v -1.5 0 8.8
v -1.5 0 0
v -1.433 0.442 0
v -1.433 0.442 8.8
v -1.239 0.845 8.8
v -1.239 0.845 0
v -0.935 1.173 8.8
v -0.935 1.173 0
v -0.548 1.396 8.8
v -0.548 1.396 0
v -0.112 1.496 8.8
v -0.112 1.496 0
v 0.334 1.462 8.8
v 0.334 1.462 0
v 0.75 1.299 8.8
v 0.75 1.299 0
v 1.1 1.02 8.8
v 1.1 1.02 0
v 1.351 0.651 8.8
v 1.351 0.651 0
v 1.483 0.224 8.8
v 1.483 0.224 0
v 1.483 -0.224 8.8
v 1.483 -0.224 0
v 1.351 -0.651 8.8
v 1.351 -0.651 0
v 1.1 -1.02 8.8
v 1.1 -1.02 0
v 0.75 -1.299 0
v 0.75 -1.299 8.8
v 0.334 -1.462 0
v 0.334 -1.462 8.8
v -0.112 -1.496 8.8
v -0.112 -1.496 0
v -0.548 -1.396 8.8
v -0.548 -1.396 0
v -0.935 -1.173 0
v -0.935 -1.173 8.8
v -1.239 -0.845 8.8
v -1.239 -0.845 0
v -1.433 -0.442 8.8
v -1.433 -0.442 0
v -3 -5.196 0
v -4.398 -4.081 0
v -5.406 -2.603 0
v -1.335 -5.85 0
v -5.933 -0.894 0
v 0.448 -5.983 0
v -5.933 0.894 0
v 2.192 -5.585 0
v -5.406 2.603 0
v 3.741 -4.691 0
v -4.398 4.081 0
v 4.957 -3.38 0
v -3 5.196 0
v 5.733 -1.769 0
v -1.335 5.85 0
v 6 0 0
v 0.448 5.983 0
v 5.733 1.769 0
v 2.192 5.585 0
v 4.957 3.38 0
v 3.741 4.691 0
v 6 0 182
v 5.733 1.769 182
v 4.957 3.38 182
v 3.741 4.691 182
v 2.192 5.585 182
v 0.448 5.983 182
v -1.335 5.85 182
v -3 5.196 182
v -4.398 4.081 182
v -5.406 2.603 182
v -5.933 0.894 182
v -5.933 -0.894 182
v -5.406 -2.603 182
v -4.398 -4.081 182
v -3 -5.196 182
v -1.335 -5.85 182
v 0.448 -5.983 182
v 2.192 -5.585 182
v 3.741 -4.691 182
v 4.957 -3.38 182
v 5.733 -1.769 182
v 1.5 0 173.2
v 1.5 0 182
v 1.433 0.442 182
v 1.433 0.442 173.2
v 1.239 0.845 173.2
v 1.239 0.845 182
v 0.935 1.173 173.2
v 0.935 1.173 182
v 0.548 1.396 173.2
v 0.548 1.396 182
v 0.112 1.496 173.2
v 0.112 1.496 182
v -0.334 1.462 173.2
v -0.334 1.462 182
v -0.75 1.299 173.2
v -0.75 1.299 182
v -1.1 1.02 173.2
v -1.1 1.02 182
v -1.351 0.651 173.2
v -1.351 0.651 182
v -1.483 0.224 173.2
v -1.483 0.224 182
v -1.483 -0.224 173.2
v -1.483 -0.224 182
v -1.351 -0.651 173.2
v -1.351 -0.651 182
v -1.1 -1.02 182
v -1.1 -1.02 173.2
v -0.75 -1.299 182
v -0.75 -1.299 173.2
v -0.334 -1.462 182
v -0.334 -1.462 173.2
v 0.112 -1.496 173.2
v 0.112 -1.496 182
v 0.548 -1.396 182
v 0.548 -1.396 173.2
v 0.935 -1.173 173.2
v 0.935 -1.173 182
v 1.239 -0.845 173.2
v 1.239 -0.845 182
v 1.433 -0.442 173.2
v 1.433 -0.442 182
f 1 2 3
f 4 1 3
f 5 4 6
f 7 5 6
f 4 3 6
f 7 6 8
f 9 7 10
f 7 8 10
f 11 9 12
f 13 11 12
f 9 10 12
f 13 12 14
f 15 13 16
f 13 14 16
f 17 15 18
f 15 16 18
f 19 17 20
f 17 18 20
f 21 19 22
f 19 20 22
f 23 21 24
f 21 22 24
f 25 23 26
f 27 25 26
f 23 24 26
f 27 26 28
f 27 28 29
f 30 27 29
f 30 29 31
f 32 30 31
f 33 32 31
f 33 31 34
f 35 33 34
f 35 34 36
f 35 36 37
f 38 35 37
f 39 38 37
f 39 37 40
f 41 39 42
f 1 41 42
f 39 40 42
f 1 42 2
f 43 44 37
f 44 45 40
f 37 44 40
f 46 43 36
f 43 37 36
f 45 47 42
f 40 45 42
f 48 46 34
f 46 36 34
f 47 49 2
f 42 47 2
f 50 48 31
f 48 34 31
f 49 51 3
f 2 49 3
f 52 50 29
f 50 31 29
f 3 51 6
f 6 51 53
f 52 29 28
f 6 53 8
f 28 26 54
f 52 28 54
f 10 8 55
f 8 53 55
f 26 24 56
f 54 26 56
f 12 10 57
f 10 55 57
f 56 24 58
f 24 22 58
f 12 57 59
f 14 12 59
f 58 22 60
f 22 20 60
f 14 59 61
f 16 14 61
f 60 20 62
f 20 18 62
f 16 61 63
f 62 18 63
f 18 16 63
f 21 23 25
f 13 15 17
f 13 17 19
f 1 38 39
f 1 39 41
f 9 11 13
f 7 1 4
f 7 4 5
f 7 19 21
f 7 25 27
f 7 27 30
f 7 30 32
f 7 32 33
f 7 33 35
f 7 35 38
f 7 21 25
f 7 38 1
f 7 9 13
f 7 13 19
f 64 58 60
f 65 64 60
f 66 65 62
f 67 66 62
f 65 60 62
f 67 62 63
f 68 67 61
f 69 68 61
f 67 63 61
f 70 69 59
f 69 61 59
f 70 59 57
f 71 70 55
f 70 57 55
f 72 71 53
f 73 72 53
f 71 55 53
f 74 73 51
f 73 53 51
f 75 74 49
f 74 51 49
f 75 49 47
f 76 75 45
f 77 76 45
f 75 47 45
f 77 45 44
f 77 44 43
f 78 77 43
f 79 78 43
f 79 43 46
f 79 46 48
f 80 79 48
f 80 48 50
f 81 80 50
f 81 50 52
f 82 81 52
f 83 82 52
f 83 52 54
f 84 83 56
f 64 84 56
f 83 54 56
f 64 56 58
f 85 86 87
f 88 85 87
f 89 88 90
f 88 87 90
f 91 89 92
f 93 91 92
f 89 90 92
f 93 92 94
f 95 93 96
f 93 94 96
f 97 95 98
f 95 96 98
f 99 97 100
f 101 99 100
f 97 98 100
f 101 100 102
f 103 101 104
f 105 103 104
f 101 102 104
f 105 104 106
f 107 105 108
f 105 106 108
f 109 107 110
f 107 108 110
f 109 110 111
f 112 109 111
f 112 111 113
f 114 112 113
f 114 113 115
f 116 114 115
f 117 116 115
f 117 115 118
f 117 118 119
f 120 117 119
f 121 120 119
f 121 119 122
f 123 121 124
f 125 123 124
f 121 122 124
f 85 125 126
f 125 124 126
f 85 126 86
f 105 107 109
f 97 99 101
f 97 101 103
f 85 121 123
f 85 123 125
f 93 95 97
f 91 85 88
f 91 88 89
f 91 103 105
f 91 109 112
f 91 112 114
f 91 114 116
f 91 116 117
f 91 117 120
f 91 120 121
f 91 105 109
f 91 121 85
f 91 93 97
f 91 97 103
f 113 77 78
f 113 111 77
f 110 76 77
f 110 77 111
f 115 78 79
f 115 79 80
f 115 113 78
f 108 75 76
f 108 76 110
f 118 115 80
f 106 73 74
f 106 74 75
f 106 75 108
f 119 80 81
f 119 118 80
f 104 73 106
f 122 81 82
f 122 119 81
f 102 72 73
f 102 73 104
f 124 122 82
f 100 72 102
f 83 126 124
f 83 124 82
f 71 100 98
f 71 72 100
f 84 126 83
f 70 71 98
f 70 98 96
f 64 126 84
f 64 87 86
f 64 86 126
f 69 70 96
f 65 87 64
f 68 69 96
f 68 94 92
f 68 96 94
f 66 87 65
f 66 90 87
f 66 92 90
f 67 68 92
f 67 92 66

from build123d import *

# Parameters (mm, degrees)
SKETCH_1_R          = 6
EXTRUDE_1_DEPTH     = 182
SKETCH_2_R          = 1.5
CUT_EXTRUDE_1_DEPTH = 8.8
SKETCH_7_R          = 1.5
CUT_EXTRUDE_2_DEPTH = 8.8


with BuildPart() as part:
    # ｽｹｯﾁ1 → ﾎﾞｽ - 押し出し1 (new body)
    with BuildSketch(Plane.XY):
        Circle(SKETCH_1_R)
    extrude(amount=EXTRUDE_1_DEPTH)

    # ｽｹｯﾁ2 → ｶｯﾄ - 押し出し1 (cut)
    with BuildSketch(Plane.XY.offset(182)):
        Circle(SKETCH_2_R)
    extrude(amount=-CUT_EXTRUDE_1_DEPTH, mode=Mode.SUBTRACT)

    # ｽｹｯﾁ7 → ｶｯﾄ - 押し出し2 (cut)
    with BuildSketch(Plane(origin=(0, 0, 0), x_dir=(-1, 0, 0), z_dir=(0, 0, -1))):
        Circle(SKETCH_7_R)
    extrude(amount=-CUT_EXTRUDE_2_DEPTH, mode=Mode.SUBTRACT)


solid = part.part
